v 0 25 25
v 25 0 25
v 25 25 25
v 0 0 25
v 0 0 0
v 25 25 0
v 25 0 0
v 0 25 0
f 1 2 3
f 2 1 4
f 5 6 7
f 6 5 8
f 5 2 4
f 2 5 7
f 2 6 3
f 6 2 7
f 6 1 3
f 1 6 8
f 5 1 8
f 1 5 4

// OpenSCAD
// cube_param.scad
// param: size=10
module param_cube(size=10) {
    cube(size=25);
}
param_cube(size=10);
